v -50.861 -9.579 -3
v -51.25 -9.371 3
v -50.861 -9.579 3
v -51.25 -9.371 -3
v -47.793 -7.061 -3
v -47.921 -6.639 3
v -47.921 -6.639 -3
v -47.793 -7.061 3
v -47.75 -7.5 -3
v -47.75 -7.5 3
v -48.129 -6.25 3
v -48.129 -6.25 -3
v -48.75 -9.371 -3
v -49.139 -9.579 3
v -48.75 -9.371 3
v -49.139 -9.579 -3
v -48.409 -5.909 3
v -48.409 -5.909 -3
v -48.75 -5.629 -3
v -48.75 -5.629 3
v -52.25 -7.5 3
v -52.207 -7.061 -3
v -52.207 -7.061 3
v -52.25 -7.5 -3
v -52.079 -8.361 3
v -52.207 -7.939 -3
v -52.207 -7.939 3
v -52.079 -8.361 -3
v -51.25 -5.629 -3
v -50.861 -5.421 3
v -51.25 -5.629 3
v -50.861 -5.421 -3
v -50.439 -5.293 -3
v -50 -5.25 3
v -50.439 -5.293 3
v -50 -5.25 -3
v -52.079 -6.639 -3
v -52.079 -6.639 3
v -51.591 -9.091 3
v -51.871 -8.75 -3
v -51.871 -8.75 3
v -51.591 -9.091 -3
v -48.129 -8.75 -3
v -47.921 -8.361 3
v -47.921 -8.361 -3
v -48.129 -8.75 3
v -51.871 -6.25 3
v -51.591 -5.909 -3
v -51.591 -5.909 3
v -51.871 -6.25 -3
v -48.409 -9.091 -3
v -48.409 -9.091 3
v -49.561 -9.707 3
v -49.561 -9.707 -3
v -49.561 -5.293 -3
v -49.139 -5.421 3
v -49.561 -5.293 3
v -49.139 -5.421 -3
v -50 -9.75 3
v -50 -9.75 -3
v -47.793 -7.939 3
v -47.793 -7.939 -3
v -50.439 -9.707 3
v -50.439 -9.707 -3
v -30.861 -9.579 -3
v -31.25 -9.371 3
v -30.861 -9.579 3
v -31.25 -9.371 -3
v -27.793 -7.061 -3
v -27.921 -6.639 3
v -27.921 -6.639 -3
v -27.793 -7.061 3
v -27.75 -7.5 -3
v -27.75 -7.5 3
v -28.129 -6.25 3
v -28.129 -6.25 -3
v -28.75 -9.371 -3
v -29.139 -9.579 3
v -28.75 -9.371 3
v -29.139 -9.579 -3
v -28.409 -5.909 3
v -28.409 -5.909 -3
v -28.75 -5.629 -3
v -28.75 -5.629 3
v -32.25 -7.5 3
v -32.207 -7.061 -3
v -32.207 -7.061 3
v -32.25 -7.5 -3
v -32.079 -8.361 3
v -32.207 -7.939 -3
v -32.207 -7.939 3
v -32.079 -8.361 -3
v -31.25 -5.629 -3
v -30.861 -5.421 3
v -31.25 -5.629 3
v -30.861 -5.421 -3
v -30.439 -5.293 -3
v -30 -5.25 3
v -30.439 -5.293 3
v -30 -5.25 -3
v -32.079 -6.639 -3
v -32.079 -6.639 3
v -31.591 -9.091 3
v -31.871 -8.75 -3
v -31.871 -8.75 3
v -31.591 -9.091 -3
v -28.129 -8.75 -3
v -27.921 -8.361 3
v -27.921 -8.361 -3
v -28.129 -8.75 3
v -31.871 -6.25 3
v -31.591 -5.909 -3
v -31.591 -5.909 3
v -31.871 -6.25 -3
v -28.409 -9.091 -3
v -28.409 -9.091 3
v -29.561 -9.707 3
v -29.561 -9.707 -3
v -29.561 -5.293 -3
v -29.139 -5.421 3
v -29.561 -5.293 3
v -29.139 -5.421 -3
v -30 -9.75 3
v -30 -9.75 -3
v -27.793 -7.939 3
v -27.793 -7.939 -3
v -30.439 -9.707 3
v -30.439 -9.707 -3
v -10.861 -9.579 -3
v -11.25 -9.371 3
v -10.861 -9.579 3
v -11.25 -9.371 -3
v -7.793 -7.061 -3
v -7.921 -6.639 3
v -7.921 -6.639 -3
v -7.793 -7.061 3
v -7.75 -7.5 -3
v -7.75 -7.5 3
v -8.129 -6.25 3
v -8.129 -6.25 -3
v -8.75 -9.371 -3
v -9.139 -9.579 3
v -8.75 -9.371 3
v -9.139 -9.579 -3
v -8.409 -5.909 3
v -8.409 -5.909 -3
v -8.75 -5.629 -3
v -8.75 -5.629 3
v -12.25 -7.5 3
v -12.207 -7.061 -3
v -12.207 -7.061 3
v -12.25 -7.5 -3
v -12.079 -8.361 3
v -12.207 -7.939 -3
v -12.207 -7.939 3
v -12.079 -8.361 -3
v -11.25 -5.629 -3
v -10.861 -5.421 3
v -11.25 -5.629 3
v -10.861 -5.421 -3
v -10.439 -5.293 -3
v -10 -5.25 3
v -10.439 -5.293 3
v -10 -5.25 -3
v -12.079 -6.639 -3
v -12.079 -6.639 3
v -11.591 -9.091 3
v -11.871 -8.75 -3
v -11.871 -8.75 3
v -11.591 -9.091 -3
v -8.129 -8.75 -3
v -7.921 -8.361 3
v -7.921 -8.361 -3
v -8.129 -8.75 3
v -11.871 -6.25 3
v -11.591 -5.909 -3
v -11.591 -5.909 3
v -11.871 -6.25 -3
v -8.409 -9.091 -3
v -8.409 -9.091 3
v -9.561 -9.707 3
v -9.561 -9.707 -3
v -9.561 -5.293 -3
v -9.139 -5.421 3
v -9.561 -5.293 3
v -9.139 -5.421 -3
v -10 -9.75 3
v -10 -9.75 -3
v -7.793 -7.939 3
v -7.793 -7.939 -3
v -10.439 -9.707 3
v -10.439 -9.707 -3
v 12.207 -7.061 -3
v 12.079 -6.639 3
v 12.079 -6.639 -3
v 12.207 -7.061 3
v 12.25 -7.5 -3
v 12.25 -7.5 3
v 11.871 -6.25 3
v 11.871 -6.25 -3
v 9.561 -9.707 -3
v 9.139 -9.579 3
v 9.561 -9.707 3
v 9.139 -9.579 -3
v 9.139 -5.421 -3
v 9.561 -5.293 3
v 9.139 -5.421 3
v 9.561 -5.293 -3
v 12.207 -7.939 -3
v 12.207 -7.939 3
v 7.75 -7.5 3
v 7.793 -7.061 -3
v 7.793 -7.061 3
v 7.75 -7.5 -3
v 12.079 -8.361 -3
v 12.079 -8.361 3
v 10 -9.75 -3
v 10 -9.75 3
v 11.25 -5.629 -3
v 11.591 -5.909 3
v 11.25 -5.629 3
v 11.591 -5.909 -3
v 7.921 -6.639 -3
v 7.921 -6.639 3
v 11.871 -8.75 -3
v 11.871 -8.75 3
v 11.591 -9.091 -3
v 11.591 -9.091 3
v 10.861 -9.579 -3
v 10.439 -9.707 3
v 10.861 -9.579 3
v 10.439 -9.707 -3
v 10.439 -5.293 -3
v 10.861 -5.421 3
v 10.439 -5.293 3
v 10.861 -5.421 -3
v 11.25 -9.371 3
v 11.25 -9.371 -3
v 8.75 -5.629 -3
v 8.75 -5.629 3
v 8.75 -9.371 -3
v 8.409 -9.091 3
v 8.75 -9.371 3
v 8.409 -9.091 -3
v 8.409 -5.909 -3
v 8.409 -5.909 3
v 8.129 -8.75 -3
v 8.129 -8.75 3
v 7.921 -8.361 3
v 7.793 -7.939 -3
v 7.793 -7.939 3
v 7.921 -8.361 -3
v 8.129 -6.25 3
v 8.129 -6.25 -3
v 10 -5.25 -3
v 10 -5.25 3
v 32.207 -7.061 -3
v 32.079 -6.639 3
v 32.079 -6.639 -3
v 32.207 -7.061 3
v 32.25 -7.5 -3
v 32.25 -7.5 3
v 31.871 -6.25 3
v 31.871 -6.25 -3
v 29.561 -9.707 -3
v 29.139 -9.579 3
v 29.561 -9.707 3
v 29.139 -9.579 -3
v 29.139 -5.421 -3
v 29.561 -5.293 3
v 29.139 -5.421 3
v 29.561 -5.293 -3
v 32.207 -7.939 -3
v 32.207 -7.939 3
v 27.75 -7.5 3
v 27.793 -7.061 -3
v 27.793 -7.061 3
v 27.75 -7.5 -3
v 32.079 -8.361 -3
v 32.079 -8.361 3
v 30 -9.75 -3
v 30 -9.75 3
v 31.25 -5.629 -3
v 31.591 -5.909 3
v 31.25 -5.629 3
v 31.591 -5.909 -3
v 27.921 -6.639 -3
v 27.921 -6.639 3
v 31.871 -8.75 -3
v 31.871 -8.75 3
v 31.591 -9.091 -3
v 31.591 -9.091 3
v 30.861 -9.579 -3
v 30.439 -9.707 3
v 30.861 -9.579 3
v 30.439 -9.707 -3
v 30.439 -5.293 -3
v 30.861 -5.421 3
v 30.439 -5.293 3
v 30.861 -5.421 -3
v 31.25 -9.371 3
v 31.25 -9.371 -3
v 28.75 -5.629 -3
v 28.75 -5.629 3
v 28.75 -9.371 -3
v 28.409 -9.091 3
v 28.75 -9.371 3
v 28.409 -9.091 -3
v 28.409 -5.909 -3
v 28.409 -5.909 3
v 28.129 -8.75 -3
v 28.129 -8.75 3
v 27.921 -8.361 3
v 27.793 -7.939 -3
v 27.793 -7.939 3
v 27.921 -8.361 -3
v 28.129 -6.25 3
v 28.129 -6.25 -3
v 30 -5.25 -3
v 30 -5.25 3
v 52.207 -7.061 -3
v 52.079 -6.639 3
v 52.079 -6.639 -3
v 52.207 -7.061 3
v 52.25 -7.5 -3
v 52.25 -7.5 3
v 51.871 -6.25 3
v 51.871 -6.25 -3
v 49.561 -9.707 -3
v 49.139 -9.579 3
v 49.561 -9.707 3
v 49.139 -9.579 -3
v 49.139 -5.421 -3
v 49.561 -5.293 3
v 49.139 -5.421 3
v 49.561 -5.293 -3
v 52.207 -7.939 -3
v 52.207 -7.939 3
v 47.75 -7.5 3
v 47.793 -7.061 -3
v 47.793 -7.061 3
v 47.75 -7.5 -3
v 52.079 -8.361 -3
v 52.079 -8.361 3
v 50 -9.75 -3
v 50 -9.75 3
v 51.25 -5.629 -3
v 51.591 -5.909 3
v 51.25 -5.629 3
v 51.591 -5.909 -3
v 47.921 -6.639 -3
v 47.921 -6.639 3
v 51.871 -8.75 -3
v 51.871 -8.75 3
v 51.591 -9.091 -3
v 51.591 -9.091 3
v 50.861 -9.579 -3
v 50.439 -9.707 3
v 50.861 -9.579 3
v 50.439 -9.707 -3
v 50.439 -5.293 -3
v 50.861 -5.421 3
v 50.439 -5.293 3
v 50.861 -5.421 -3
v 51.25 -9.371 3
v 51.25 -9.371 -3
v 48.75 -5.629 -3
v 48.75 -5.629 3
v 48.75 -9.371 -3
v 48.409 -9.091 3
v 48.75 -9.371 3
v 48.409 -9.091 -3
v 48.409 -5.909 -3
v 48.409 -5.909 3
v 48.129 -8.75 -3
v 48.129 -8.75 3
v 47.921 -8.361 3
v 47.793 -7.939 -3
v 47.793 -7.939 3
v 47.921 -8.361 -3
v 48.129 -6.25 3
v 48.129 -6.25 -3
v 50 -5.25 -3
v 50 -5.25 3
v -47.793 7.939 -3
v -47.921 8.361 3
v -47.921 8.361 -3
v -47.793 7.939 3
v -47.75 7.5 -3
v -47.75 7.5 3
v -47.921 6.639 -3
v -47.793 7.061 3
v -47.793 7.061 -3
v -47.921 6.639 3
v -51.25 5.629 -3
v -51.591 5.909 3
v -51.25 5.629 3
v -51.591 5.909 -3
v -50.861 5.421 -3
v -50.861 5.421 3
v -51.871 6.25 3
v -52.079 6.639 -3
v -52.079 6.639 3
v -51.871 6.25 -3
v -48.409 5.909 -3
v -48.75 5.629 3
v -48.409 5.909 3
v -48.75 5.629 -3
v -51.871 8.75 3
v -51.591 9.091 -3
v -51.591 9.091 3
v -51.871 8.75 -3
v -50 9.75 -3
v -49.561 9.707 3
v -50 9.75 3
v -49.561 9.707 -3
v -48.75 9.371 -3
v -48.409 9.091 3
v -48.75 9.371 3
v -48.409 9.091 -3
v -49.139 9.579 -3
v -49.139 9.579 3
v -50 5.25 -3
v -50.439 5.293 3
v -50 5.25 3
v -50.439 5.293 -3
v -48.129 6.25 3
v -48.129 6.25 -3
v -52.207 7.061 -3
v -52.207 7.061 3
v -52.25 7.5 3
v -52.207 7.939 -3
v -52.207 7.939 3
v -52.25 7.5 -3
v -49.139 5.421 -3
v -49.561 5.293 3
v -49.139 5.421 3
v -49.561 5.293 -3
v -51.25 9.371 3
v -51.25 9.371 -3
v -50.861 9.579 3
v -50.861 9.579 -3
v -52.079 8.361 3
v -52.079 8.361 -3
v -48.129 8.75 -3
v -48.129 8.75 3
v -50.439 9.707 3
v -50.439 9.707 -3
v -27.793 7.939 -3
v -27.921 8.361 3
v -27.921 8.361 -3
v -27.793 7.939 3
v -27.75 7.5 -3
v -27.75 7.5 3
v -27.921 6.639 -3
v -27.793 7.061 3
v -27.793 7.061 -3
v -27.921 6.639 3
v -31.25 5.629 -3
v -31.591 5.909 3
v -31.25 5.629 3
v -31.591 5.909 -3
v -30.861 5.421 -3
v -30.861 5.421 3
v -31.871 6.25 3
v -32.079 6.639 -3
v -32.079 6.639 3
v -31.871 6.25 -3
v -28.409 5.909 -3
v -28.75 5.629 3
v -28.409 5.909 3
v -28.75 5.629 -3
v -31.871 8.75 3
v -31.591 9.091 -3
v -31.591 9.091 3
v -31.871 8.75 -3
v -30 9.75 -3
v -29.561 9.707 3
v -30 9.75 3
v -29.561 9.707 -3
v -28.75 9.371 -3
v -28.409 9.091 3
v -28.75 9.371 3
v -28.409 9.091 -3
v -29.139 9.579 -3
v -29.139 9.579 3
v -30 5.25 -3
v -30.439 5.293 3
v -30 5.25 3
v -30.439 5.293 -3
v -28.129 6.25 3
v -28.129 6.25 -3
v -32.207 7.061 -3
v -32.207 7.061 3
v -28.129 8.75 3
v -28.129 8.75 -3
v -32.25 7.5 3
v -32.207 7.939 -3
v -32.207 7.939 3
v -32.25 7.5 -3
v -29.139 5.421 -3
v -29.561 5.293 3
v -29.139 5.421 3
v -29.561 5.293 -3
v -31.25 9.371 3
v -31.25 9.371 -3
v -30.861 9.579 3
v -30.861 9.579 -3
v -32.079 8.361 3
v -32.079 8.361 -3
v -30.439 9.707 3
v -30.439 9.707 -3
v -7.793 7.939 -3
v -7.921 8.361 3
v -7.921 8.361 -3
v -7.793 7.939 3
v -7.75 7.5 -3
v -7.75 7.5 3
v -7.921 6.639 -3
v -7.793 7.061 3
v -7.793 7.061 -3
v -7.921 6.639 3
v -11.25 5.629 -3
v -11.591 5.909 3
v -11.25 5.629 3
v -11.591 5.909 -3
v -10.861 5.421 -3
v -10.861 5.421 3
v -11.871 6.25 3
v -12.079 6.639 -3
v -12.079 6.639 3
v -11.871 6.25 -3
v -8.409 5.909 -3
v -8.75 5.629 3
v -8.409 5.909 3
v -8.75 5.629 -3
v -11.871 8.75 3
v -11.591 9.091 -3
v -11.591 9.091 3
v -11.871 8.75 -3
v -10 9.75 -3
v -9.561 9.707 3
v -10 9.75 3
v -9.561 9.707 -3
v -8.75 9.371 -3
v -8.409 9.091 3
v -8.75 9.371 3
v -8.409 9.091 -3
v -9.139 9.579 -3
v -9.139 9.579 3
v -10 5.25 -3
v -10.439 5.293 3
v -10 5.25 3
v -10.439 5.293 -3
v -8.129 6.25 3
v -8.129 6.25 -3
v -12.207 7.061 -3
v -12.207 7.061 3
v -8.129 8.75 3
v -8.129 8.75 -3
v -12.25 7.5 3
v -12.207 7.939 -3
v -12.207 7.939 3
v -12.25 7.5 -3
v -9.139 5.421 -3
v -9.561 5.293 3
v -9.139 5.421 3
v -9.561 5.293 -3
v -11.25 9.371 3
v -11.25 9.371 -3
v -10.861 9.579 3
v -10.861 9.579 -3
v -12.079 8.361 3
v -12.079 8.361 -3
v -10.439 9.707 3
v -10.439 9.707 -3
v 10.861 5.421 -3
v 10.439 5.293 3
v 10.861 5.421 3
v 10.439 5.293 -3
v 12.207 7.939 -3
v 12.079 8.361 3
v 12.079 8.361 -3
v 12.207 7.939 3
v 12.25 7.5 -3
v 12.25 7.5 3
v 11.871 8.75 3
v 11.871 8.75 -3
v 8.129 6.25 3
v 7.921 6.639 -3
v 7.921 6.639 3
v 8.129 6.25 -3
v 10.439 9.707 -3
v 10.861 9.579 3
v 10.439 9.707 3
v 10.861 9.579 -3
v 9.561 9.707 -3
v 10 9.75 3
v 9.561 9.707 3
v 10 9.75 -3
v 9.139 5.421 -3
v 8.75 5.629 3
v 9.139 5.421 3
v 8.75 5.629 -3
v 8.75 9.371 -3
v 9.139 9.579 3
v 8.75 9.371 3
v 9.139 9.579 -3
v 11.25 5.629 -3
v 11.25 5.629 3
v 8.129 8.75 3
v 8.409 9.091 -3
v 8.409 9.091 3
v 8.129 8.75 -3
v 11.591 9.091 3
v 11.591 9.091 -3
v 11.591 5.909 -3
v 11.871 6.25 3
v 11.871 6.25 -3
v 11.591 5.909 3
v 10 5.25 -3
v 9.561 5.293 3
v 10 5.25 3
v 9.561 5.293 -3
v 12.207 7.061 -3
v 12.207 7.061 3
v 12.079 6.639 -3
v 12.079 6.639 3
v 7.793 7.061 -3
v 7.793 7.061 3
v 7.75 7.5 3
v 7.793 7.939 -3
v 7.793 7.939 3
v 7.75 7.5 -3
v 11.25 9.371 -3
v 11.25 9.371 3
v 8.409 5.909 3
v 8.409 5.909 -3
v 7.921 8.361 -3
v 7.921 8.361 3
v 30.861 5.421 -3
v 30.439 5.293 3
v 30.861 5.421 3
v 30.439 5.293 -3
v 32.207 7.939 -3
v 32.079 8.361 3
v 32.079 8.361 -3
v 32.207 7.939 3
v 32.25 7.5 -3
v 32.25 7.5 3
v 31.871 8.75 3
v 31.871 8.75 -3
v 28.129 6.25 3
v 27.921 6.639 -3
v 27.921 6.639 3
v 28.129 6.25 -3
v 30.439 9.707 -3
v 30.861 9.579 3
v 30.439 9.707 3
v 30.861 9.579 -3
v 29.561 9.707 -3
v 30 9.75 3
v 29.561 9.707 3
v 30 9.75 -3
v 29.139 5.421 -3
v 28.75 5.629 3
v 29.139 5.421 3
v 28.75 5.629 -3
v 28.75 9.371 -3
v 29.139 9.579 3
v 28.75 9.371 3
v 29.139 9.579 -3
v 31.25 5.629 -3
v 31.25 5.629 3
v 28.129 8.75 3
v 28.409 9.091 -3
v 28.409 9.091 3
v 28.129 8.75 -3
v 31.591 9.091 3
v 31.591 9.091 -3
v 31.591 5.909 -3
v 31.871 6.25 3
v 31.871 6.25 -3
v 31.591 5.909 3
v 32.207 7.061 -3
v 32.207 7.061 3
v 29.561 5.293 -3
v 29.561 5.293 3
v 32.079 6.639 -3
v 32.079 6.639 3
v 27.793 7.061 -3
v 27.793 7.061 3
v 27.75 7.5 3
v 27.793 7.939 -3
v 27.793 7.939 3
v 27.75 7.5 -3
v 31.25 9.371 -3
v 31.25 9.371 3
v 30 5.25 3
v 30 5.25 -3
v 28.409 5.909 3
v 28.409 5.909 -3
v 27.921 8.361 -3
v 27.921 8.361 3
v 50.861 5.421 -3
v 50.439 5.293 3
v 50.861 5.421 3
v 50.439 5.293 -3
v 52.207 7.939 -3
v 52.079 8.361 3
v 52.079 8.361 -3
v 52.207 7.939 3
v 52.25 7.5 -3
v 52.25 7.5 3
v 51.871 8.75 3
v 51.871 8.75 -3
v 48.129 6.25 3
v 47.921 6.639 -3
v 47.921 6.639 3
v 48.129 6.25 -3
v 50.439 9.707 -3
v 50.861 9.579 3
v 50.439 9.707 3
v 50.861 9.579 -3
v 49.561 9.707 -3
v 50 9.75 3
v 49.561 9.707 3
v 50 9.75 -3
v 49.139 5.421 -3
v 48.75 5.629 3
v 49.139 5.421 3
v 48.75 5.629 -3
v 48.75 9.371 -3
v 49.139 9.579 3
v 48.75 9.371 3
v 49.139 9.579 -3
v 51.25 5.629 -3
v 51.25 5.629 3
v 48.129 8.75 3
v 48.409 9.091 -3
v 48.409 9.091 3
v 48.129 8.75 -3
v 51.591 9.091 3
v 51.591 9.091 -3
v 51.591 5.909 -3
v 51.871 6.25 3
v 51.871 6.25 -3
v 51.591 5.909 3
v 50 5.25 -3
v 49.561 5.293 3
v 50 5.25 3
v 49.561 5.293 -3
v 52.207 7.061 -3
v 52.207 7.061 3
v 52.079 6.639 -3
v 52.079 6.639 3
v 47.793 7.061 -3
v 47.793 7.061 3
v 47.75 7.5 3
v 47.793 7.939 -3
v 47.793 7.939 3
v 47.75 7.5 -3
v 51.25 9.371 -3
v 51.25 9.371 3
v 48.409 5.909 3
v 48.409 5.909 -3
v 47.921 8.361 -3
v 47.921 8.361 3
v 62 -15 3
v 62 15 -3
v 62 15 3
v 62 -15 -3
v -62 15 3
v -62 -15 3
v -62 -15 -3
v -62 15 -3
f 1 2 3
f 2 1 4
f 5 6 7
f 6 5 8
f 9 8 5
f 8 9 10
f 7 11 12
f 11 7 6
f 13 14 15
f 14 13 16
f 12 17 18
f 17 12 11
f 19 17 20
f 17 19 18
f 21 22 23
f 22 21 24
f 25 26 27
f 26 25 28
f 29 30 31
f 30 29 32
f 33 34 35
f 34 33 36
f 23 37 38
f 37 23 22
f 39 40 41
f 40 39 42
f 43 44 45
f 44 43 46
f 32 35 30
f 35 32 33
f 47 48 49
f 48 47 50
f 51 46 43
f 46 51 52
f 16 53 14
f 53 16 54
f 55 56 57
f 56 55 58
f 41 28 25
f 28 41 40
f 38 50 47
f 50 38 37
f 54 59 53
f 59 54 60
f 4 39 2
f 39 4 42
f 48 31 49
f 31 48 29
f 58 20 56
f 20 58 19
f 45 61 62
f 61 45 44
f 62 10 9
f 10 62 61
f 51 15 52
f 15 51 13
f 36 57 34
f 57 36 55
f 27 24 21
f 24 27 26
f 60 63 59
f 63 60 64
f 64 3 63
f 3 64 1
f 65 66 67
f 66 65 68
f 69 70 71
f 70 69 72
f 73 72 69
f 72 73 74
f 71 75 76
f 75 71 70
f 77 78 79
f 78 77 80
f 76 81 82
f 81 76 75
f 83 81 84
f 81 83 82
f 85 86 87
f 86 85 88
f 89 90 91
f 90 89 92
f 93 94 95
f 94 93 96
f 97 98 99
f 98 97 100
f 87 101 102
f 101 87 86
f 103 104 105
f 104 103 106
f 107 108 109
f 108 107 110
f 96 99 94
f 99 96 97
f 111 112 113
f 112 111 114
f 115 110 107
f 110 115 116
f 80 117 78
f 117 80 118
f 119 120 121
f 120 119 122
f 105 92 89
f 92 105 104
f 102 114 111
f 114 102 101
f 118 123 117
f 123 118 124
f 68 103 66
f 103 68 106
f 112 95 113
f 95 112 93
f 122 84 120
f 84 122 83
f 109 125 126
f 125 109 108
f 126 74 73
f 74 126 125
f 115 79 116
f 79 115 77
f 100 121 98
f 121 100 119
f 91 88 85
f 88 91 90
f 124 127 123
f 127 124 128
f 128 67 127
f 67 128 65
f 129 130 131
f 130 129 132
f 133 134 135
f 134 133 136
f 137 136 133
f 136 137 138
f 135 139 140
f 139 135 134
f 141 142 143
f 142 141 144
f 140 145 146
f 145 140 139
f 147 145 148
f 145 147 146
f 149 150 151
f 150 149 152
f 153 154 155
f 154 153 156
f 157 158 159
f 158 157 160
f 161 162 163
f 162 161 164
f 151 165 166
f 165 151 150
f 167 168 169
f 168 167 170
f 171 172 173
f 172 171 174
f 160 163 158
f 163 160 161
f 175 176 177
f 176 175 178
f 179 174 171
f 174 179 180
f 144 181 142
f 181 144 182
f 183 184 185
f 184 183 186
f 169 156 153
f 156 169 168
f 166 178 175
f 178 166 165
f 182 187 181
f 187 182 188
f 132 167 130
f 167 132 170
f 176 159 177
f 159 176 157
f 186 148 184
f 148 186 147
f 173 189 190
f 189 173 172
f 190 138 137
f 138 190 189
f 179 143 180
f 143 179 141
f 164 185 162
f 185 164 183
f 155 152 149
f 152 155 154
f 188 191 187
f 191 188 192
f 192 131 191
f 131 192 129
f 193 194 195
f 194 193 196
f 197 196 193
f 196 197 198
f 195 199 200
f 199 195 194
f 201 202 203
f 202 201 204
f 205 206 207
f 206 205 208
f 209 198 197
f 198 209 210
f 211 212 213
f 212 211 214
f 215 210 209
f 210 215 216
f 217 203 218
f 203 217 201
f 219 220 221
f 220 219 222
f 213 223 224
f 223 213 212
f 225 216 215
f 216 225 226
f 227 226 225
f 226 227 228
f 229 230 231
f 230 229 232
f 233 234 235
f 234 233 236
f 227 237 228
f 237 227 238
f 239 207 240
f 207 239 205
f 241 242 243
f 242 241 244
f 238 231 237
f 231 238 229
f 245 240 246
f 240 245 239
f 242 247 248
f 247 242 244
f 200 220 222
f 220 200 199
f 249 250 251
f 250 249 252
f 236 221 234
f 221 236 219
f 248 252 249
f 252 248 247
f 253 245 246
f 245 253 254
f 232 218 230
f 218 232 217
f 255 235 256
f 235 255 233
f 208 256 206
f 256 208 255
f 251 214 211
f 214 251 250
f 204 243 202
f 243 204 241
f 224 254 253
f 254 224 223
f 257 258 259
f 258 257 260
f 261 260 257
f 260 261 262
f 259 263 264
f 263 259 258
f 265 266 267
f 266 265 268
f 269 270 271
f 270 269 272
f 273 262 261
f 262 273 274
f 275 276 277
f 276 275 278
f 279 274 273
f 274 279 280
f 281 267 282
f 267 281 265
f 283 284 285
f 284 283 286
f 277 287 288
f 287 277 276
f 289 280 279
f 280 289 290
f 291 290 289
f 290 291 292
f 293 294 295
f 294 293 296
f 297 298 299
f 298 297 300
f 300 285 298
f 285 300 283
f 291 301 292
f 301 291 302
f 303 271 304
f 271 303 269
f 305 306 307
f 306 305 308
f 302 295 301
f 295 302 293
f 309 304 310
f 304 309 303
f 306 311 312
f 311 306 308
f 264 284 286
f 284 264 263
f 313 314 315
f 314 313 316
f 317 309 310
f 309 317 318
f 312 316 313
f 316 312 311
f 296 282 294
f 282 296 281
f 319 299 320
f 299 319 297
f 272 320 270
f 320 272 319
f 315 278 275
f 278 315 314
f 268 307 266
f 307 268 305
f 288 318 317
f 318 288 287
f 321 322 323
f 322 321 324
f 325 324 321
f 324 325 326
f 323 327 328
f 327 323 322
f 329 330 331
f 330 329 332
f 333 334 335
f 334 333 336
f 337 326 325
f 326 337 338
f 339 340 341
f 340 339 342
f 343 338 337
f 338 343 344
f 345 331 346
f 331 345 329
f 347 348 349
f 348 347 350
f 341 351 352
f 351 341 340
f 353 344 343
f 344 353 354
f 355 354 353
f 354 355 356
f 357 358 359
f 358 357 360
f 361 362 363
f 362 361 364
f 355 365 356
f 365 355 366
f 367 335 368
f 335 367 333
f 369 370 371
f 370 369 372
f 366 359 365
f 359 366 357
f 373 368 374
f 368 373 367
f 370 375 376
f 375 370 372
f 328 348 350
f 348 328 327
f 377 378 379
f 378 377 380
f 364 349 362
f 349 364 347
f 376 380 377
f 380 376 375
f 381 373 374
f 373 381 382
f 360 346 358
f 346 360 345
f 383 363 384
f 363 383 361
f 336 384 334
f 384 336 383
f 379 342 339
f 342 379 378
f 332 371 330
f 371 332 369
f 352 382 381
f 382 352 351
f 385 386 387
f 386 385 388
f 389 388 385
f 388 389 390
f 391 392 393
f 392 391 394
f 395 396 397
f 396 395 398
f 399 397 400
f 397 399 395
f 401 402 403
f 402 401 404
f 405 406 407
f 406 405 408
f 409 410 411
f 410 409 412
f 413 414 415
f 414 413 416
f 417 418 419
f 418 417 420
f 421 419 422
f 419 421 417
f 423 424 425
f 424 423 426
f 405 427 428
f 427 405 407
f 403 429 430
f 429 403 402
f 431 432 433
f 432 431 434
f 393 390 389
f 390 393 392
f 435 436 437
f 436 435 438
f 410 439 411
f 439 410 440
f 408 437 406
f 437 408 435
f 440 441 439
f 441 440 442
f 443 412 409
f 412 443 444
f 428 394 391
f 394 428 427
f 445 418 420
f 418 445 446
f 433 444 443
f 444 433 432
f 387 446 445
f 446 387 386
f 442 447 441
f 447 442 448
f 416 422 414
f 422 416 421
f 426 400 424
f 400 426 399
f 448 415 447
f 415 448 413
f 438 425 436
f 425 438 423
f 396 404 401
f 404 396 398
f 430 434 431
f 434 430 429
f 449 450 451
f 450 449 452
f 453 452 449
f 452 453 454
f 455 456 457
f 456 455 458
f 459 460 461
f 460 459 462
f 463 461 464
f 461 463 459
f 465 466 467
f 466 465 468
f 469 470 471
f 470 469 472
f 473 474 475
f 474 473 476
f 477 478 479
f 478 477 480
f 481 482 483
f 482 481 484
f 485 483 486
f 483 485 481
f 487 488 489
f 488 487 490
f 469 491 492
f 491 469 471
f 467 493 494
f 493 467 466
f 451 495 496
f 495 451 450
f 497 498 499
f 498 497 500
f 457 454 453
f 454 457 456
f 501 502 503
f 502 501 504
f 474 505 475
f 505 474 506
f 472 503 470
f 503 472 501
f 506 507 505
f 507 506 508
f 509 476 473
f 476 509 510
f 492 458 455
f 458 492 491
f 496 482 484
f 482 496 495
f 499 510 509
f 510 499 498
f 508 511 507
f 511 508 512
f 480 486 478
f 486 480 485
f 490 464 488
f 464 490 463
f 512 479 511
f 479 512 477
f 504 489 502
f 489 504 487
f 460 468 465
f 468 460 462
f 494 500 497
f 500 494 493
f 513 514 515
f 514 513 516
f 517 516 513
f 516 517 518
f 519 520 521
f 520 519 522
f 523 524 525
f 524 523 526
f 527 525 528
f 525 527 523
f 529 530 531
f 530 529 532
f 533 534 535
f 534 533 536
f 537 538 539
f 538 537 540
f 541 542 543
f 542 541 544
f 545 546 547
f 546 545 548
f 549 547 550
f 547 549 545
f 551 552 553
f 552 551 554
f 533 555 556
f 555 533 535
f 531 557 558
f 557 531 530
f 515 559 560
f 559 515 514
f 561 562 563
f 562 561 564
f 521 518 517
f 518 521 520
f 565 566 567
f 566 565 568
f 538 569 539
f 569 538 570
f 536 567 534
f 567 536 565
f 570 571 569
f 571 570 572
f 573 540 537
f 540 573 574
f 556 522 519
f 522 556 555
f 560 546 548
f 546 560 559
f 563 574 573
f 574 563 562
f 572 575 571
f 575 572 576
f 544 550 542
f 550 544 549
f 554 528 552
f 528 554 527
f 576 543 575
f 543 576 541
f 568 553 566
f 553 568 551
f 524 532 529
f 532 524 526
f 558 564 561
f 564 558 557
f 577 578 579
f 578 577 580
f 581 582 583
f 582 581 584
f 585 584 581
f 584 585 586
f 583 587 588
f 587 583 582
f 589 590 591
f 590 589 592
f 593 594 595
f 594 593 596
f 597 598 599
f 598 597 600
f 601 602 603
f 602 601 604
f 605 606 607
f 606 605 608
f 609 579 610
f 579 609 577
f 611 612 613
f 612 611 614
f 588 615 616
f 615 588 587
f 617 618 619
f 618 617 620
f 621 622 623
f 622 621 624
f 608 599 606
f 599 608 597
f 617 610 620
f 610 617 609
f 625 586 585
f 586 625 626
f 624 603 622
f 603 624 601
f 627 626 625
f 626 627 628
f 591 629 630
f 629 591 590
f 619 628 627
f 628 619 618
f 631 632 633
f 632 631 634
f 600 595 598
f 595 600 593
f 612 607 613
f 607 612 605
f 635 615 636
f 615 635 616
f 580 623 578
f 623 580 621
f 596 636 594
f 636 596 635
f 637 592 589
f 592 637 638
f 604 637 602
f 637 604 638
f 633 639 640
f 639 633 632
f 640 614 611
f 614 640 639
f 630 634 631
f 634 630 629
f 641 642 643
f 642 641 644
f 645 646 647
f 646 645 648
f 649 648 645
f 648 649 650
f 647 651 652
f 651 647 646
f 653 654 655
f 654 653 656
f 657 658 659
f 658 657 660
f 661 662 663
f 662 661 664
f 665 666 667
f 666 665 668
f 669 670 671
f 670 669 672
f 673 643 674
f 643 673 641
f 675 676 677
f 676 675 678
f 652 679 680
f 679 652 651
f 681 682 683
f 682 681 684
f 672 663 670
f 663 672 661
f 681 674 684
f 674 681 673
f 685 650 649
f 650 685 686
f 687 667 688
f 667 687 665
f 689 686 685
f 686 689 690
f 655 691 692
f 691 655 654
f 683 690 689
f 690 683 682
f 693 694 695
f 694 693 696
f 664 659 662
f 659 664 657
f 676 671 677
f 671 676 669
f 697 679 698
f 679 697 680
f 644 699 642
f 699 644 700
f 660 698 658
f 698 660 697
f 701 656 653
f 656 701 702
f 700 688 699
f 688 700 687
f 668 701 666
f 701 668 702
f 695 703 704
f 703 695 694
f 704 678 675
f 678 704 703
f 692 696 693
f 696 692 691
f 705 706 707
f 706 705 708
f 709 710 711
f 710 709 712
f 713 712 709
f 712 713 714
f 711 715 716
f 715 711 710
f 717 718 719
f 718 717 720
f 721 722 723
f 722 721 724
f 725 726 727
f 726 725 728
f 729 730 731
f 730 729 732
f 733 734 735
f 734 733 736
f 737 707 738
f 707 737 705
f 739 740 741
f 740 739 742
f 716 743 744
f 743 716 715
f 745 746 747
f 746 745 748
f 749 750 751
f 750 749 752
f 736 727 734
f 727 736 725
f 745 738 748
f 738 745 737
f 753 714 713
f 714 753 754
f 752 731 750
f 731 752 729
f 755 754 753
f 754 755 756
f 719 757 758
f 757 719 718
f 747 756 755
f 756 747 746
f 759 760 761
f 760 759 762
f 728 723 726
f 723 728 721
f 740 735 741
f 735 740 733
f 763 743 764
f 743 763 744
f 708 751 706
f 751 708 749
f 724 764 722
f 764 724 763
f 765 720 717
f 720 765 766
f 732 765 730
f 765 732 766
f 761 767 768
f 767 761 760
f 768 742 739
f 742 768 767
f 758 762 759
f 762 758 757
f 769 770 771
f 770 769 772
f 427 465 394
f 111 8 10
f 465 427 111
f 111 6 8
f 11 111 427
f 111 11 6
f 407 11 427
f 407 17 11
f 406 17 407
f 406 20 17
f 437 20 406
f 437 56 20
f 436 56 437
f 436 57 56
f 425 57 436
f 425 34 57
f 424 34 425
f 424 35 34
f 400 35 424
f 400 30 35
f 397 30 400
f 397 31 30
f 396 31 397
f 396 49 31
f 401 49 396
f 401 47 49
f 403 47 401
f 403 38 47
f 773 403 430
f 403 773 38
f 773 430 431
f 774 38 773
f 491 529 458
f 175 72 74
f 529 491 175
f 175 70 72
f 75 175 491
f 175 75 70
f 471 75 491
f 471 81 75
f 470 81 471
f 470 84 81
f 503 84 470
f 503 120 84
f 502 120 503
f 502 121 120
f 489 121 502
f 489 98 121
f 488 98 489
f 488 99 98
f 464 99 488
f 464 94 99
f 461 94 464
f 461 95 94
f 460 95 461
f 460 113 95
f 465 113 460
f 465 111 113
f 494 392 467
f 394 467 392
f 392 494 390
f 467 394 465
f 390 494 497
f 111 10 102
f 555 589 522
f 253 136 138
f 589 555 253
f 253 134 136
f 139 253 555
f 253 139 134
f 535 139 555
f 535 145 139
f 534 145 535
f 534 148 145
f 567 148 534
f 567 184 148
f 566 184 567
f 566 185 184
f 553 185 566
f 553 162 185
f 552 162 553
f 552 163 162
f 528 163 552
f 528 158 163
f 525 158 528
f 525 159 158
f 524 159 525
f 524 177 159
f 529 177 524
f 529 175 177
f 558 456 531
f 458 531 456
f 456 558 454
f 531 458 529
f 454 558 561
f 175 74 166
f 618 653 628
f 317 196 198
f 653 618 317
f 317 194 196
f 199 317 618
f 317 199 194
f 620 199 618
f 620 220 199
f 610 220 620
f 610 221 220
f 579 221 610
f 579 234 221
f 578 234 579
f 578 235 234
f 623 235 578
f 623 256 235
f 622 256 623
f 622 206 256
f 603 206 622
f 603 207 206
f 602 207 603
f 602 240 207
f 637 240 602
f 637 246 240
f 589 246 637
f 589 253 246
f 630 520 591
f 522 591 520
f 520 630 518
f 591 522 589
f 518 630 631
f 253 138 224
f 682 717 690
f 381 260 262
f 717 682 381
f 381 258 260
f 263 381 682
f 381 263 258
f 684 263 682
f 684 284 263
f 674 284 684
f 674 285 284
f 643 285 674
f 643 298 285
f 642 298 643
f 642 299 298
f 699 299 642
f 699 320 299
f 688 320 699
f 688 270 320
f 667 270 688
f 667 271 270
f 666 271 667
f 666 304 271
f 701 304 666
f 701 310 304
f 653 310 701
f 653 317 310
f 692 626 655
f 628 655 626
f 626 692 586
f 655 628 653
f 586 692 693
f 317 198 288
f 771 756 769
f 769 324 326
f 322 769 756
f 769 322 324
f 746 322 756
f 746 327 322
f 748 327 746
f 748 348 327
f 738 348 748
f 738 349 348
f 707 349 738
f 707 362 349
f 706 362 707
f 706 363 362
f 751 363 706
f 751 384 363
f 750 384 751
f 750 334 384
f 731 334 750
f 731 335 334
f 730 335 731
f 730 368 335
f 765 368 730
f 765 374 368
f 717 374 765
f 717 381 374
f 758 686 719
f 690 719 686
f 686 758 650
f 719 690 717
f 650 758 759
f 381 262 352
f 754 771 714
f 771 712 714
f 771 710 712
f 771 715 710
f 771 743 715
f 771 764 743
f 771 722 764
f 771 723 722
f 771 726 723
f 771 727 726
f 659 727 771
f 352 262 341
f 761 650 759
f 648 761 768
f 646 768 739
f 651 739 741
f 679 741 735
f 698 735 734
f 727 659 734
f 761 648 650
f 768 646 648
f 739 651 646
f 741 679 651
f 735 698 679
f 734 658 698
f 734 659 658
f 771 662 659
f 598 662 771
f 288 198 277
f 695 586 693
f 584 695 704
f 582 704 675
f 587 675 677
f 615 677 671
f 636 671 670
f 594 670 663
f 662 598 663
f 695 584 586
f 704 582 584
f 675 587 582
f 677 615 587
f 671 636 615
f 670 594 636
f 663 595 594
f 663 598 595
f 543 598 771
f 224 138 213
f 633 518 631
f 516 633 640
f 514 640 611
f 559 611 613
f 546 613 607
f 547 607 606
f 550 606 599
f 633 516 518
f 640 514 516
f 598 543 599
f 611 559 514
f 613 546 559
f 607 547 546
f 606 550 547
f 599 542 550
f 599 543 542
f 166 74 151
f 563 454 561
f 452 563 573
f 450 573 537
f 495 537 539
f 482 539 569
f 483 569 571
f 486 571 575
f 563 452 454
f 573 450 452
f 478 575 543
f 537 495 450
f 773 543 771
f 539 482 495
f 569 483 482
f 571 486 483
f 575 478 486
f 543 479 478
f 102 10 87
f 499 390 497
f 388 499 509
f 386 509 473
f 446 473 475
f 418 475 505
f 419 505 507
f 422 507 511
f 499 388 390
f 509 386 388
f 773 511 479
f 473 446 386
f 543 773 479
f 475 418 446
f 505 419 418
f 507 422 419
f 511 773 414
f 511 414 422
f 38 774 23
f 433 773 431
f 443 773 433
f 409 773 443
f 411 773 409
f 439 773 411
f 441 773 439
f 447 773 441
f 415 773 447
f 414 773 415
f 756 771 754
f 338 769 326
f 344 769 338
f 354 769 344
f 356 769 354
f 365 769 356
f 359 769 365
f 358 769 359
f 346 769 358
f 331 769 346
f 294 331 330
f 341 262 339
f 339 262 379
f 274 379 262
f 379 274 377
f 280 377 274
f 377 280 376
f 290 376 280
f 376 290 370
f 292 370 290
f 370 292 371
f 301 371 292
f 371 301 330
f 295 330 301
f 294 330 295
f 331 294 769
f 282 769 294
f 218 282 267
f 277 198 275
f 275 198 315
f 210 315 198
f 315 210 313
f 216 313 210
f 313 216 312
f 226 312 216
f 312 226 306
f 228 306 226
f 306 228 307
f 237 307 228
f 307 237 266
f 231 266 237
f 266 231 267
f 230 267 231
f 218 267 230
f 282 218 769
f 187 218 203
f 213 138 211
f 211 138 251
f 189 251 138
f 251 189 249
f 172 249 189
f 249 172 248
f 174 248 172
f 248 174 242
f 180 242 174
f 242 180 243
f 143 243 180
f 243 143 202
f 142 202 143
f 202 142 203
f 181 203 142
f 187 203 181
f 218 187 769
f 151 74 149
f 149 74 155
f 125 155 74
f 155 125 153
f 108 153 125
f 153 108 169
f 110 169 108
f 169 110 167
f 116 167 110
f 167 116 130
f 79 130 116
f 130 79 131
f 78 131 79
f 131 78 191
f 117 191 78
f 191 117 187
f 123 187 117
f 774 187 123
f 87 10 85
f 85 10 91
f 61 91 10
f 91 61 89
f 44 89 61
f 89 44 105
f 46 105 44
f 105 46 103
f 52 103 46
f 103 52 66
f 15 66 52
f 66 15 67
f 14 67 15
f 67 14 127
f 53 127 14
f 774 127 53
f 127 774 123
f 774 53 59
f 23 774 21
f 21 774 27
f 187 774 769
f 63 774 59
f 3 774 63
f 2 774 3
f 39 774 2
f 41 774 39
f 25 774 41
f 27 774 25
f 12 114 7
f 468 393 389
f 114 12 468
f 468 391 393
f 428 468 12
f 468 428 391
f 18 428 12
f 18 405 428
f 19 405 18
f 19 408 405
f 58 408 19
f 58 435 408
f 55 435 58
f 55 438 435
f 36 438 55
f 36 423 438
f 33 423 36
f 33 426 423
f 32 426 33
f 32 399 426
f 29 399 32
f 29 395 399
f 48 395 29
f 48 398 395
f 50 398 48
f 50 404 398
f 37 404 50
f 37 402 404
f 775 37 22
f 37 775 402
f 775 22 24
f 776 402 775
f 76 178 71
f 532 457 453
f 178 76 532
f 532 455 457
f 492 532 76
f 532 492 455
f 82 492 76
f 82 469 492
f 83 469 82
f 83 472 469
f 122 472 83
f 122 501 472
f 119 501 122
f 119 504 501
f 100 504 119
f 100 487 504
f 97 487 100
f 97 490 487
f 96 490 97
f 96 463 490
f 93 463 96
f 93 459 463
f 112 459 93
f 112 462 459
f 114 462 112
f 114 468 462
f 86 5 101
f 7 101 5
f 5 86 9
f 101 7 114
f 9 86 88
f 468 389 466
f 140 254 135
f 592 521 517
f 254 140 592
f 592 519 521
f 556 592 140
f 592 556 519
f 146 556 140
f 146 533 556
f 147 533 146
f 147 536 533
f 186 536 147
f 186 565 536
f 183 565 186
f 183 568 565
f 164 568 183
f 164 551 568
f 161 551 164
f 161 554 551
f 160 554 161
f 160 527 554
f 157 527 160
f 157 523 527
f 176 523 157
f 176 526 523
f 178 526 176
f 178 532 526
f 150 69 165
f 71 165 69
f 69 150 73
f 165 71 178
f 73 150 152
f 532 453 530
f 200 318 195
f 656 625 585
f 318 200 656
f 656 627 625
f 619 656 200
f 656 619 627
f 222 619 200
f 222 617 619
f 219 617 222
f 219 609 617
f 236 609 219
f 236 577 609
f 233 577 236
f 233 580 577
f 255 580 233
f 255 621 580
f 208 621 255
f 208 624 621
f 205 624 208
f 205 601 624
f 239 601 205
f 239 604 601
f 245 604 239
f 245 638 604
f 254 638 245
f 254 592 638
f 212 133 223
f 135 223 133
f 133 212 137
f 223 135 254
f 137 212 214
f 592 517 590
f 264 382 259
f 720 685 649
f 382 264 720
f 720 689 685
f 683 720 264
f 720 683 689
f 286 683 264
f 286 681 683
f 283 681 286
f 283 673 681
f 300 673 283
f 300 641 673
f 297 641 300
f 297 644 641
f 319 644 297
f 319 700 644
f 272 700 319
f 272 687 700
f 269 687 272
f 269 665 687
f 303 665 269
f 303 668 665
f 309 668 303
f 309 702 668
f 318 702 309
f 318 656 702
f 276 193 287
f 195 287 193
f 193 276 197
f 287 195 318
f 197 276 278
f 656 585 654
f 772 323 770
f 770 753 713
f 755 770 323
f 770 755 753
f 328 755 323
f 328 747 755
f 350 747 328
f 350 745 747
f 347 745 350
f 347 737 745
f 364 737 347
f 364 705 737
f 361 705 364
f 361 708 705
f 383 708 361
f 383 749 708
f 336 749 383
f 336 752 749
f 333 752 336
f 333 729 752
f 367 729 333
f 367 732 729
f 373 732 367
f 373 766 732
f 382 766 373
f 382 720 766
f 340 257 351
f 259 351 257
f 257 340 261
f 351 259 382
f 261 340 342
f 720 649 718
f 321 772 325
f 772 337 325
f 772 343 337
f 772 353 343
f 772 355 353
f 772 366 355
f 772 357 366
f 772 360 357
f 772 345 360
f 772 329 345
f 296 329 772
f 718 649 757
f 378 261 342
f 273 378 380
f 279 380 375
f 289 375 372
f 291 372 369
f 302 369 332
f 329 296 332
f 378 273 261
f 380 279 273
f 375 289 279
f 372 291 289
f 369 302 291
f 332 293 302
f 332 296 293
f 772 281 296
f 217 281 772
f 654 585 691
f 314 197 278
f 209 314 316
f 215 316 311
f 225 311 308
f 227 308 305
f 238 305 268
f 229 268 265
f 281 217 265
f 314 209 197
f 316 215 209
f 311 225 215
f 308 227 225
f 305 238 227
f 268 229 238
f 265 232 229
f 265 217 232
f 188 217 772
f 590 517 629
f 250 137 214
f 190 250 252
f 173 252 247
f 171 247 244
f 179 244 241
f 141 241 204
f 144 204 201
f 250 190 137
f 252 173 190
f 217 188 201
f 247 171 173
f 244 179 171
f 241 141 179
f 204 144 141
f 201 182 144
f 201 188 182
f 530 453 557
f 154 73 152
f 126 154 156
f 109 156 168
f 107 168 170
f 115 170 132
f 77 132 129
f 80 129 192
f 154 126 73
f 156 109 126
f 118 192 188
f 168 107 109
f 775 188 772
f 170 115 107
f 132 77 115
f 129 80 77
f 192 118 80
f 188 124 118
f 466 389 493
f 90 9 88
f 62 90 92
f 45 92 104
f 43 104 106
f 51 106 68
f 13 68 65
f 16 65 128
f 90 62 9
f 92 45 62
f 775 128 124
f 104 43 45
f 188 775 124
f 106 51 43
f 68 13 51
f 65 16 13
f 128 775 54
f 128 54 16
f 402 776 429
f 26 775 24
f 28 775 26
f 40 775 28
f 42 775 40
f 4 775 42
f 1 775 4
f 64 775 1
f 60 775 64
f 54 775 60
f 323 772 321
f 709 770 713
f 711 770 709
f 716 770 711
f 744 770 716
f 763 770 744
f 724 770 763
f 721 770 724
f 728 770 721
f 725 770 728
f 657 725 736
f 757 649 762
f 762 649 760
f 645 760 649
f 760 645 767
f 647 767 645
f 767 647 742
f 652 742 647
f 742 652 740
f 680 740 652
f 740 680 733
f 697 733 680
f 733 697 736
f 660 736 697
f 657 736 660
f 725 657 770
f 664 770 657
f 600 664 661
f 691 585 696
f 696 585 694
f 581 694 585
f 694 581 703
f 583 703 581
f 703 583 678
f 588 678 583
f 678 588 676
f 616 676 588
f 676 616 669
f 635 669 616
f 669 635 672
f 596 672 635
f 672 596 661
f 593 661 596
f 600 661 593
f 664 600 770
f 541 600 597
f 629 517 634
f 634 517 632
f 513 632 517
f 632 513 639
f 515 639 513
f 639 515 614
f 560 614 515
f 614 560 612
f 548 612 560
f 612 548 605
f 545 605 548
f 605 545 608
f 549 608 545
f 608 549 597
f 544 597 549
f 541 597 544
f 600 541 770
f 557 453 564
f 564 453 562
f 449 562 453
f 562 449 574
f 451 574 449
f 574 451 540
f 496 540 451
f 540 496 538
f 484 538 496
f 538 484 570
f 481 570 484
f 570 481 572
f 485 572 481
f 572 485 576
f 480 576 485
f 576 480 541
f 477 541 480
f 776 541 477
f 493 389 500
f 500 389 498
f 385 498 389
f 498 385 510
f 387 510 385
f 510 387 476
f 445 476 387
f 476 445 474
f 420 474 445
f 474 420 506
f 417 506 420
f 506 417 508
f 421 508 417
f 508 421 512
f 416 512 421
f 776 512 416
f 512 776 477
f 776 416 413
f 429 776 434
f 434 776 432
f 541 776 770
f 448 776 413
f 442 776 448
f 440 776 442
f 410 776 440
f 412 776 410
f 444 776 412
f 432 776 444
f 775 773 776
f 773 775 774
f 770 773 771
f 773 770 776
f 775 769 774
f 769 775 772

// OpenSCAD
$fn = 32;

// ----------------------------------------------------------------------
// Hole bar, 6 x Ø4.5
// tworows layout, 12 mm edge offset
// ----------------------------------------------------------------------

// --- parameters (mm) ---
bar_w = 30;       // bar width (Y)
bar_t = 6;        // bar thickness (Z)
holes = 6;        // holes per row
hole_d = 4.5;     // hole diameter
edge = 12;        // offset from the bar end to the first hole
pitch = 20;       // pitch between neighbouring holes
row_offset = 15;  // distance between the two rows

// --- derived feature positions (mm) ---
span = (holes - 1) * pitch;   // = 100   distance between the end holes
bar_l = span + 2 * edge;      // = 124   overall bar length
start_x = -bar_l / 2 + edge;  // = -50   X of the first hole
feature_centers = [
  [start_x + 0 * pitch, -row_offset / 2],
  [start_x + 1 * pitch, -row_offset / 2],
  [start_x + 2 * pitch, -row_offset / 2],
  [start_x + 3 * pitch, -row_offset / 2],
  [start_x + 4 * pitch, -row_offset / 2],
  [start_x + 5 * pitch, -row_offset / 2]
];   // hole centres of the first row
row2_centers = [
  [start_x + 0 * pitch, row_offset / 2],
  [start_x + 1 * pitch, row_offset / 2],
  [start_x + 2 * pitch, row_offset / 2],
  [start_x + 3 * pitch, row_offset / 2],
  [start_x + 4 * pitch, row_offset / 2],
  [start_x + 5 * pitch, row_offset / 2]
];   // hole centres of the second row

// bar with two rows of holes, both read from their own centre arrays
difference() {
  translate([-bar_l / 2, -bar_w / 2, -bar_t / 2]) cube([bar_l, bar_w, bar_t]);
  for (centre = feature_centers)
    translate([centre[0], centre[1], 0])
      cylinder(d = hole_d, h = bar_t + 2, center = true);
  for (centre = row2_centers)
    translate([centre[0], centre[1], 0])
      cylinder(d = hole_d, h = bar_t + 2, center = true);
}
